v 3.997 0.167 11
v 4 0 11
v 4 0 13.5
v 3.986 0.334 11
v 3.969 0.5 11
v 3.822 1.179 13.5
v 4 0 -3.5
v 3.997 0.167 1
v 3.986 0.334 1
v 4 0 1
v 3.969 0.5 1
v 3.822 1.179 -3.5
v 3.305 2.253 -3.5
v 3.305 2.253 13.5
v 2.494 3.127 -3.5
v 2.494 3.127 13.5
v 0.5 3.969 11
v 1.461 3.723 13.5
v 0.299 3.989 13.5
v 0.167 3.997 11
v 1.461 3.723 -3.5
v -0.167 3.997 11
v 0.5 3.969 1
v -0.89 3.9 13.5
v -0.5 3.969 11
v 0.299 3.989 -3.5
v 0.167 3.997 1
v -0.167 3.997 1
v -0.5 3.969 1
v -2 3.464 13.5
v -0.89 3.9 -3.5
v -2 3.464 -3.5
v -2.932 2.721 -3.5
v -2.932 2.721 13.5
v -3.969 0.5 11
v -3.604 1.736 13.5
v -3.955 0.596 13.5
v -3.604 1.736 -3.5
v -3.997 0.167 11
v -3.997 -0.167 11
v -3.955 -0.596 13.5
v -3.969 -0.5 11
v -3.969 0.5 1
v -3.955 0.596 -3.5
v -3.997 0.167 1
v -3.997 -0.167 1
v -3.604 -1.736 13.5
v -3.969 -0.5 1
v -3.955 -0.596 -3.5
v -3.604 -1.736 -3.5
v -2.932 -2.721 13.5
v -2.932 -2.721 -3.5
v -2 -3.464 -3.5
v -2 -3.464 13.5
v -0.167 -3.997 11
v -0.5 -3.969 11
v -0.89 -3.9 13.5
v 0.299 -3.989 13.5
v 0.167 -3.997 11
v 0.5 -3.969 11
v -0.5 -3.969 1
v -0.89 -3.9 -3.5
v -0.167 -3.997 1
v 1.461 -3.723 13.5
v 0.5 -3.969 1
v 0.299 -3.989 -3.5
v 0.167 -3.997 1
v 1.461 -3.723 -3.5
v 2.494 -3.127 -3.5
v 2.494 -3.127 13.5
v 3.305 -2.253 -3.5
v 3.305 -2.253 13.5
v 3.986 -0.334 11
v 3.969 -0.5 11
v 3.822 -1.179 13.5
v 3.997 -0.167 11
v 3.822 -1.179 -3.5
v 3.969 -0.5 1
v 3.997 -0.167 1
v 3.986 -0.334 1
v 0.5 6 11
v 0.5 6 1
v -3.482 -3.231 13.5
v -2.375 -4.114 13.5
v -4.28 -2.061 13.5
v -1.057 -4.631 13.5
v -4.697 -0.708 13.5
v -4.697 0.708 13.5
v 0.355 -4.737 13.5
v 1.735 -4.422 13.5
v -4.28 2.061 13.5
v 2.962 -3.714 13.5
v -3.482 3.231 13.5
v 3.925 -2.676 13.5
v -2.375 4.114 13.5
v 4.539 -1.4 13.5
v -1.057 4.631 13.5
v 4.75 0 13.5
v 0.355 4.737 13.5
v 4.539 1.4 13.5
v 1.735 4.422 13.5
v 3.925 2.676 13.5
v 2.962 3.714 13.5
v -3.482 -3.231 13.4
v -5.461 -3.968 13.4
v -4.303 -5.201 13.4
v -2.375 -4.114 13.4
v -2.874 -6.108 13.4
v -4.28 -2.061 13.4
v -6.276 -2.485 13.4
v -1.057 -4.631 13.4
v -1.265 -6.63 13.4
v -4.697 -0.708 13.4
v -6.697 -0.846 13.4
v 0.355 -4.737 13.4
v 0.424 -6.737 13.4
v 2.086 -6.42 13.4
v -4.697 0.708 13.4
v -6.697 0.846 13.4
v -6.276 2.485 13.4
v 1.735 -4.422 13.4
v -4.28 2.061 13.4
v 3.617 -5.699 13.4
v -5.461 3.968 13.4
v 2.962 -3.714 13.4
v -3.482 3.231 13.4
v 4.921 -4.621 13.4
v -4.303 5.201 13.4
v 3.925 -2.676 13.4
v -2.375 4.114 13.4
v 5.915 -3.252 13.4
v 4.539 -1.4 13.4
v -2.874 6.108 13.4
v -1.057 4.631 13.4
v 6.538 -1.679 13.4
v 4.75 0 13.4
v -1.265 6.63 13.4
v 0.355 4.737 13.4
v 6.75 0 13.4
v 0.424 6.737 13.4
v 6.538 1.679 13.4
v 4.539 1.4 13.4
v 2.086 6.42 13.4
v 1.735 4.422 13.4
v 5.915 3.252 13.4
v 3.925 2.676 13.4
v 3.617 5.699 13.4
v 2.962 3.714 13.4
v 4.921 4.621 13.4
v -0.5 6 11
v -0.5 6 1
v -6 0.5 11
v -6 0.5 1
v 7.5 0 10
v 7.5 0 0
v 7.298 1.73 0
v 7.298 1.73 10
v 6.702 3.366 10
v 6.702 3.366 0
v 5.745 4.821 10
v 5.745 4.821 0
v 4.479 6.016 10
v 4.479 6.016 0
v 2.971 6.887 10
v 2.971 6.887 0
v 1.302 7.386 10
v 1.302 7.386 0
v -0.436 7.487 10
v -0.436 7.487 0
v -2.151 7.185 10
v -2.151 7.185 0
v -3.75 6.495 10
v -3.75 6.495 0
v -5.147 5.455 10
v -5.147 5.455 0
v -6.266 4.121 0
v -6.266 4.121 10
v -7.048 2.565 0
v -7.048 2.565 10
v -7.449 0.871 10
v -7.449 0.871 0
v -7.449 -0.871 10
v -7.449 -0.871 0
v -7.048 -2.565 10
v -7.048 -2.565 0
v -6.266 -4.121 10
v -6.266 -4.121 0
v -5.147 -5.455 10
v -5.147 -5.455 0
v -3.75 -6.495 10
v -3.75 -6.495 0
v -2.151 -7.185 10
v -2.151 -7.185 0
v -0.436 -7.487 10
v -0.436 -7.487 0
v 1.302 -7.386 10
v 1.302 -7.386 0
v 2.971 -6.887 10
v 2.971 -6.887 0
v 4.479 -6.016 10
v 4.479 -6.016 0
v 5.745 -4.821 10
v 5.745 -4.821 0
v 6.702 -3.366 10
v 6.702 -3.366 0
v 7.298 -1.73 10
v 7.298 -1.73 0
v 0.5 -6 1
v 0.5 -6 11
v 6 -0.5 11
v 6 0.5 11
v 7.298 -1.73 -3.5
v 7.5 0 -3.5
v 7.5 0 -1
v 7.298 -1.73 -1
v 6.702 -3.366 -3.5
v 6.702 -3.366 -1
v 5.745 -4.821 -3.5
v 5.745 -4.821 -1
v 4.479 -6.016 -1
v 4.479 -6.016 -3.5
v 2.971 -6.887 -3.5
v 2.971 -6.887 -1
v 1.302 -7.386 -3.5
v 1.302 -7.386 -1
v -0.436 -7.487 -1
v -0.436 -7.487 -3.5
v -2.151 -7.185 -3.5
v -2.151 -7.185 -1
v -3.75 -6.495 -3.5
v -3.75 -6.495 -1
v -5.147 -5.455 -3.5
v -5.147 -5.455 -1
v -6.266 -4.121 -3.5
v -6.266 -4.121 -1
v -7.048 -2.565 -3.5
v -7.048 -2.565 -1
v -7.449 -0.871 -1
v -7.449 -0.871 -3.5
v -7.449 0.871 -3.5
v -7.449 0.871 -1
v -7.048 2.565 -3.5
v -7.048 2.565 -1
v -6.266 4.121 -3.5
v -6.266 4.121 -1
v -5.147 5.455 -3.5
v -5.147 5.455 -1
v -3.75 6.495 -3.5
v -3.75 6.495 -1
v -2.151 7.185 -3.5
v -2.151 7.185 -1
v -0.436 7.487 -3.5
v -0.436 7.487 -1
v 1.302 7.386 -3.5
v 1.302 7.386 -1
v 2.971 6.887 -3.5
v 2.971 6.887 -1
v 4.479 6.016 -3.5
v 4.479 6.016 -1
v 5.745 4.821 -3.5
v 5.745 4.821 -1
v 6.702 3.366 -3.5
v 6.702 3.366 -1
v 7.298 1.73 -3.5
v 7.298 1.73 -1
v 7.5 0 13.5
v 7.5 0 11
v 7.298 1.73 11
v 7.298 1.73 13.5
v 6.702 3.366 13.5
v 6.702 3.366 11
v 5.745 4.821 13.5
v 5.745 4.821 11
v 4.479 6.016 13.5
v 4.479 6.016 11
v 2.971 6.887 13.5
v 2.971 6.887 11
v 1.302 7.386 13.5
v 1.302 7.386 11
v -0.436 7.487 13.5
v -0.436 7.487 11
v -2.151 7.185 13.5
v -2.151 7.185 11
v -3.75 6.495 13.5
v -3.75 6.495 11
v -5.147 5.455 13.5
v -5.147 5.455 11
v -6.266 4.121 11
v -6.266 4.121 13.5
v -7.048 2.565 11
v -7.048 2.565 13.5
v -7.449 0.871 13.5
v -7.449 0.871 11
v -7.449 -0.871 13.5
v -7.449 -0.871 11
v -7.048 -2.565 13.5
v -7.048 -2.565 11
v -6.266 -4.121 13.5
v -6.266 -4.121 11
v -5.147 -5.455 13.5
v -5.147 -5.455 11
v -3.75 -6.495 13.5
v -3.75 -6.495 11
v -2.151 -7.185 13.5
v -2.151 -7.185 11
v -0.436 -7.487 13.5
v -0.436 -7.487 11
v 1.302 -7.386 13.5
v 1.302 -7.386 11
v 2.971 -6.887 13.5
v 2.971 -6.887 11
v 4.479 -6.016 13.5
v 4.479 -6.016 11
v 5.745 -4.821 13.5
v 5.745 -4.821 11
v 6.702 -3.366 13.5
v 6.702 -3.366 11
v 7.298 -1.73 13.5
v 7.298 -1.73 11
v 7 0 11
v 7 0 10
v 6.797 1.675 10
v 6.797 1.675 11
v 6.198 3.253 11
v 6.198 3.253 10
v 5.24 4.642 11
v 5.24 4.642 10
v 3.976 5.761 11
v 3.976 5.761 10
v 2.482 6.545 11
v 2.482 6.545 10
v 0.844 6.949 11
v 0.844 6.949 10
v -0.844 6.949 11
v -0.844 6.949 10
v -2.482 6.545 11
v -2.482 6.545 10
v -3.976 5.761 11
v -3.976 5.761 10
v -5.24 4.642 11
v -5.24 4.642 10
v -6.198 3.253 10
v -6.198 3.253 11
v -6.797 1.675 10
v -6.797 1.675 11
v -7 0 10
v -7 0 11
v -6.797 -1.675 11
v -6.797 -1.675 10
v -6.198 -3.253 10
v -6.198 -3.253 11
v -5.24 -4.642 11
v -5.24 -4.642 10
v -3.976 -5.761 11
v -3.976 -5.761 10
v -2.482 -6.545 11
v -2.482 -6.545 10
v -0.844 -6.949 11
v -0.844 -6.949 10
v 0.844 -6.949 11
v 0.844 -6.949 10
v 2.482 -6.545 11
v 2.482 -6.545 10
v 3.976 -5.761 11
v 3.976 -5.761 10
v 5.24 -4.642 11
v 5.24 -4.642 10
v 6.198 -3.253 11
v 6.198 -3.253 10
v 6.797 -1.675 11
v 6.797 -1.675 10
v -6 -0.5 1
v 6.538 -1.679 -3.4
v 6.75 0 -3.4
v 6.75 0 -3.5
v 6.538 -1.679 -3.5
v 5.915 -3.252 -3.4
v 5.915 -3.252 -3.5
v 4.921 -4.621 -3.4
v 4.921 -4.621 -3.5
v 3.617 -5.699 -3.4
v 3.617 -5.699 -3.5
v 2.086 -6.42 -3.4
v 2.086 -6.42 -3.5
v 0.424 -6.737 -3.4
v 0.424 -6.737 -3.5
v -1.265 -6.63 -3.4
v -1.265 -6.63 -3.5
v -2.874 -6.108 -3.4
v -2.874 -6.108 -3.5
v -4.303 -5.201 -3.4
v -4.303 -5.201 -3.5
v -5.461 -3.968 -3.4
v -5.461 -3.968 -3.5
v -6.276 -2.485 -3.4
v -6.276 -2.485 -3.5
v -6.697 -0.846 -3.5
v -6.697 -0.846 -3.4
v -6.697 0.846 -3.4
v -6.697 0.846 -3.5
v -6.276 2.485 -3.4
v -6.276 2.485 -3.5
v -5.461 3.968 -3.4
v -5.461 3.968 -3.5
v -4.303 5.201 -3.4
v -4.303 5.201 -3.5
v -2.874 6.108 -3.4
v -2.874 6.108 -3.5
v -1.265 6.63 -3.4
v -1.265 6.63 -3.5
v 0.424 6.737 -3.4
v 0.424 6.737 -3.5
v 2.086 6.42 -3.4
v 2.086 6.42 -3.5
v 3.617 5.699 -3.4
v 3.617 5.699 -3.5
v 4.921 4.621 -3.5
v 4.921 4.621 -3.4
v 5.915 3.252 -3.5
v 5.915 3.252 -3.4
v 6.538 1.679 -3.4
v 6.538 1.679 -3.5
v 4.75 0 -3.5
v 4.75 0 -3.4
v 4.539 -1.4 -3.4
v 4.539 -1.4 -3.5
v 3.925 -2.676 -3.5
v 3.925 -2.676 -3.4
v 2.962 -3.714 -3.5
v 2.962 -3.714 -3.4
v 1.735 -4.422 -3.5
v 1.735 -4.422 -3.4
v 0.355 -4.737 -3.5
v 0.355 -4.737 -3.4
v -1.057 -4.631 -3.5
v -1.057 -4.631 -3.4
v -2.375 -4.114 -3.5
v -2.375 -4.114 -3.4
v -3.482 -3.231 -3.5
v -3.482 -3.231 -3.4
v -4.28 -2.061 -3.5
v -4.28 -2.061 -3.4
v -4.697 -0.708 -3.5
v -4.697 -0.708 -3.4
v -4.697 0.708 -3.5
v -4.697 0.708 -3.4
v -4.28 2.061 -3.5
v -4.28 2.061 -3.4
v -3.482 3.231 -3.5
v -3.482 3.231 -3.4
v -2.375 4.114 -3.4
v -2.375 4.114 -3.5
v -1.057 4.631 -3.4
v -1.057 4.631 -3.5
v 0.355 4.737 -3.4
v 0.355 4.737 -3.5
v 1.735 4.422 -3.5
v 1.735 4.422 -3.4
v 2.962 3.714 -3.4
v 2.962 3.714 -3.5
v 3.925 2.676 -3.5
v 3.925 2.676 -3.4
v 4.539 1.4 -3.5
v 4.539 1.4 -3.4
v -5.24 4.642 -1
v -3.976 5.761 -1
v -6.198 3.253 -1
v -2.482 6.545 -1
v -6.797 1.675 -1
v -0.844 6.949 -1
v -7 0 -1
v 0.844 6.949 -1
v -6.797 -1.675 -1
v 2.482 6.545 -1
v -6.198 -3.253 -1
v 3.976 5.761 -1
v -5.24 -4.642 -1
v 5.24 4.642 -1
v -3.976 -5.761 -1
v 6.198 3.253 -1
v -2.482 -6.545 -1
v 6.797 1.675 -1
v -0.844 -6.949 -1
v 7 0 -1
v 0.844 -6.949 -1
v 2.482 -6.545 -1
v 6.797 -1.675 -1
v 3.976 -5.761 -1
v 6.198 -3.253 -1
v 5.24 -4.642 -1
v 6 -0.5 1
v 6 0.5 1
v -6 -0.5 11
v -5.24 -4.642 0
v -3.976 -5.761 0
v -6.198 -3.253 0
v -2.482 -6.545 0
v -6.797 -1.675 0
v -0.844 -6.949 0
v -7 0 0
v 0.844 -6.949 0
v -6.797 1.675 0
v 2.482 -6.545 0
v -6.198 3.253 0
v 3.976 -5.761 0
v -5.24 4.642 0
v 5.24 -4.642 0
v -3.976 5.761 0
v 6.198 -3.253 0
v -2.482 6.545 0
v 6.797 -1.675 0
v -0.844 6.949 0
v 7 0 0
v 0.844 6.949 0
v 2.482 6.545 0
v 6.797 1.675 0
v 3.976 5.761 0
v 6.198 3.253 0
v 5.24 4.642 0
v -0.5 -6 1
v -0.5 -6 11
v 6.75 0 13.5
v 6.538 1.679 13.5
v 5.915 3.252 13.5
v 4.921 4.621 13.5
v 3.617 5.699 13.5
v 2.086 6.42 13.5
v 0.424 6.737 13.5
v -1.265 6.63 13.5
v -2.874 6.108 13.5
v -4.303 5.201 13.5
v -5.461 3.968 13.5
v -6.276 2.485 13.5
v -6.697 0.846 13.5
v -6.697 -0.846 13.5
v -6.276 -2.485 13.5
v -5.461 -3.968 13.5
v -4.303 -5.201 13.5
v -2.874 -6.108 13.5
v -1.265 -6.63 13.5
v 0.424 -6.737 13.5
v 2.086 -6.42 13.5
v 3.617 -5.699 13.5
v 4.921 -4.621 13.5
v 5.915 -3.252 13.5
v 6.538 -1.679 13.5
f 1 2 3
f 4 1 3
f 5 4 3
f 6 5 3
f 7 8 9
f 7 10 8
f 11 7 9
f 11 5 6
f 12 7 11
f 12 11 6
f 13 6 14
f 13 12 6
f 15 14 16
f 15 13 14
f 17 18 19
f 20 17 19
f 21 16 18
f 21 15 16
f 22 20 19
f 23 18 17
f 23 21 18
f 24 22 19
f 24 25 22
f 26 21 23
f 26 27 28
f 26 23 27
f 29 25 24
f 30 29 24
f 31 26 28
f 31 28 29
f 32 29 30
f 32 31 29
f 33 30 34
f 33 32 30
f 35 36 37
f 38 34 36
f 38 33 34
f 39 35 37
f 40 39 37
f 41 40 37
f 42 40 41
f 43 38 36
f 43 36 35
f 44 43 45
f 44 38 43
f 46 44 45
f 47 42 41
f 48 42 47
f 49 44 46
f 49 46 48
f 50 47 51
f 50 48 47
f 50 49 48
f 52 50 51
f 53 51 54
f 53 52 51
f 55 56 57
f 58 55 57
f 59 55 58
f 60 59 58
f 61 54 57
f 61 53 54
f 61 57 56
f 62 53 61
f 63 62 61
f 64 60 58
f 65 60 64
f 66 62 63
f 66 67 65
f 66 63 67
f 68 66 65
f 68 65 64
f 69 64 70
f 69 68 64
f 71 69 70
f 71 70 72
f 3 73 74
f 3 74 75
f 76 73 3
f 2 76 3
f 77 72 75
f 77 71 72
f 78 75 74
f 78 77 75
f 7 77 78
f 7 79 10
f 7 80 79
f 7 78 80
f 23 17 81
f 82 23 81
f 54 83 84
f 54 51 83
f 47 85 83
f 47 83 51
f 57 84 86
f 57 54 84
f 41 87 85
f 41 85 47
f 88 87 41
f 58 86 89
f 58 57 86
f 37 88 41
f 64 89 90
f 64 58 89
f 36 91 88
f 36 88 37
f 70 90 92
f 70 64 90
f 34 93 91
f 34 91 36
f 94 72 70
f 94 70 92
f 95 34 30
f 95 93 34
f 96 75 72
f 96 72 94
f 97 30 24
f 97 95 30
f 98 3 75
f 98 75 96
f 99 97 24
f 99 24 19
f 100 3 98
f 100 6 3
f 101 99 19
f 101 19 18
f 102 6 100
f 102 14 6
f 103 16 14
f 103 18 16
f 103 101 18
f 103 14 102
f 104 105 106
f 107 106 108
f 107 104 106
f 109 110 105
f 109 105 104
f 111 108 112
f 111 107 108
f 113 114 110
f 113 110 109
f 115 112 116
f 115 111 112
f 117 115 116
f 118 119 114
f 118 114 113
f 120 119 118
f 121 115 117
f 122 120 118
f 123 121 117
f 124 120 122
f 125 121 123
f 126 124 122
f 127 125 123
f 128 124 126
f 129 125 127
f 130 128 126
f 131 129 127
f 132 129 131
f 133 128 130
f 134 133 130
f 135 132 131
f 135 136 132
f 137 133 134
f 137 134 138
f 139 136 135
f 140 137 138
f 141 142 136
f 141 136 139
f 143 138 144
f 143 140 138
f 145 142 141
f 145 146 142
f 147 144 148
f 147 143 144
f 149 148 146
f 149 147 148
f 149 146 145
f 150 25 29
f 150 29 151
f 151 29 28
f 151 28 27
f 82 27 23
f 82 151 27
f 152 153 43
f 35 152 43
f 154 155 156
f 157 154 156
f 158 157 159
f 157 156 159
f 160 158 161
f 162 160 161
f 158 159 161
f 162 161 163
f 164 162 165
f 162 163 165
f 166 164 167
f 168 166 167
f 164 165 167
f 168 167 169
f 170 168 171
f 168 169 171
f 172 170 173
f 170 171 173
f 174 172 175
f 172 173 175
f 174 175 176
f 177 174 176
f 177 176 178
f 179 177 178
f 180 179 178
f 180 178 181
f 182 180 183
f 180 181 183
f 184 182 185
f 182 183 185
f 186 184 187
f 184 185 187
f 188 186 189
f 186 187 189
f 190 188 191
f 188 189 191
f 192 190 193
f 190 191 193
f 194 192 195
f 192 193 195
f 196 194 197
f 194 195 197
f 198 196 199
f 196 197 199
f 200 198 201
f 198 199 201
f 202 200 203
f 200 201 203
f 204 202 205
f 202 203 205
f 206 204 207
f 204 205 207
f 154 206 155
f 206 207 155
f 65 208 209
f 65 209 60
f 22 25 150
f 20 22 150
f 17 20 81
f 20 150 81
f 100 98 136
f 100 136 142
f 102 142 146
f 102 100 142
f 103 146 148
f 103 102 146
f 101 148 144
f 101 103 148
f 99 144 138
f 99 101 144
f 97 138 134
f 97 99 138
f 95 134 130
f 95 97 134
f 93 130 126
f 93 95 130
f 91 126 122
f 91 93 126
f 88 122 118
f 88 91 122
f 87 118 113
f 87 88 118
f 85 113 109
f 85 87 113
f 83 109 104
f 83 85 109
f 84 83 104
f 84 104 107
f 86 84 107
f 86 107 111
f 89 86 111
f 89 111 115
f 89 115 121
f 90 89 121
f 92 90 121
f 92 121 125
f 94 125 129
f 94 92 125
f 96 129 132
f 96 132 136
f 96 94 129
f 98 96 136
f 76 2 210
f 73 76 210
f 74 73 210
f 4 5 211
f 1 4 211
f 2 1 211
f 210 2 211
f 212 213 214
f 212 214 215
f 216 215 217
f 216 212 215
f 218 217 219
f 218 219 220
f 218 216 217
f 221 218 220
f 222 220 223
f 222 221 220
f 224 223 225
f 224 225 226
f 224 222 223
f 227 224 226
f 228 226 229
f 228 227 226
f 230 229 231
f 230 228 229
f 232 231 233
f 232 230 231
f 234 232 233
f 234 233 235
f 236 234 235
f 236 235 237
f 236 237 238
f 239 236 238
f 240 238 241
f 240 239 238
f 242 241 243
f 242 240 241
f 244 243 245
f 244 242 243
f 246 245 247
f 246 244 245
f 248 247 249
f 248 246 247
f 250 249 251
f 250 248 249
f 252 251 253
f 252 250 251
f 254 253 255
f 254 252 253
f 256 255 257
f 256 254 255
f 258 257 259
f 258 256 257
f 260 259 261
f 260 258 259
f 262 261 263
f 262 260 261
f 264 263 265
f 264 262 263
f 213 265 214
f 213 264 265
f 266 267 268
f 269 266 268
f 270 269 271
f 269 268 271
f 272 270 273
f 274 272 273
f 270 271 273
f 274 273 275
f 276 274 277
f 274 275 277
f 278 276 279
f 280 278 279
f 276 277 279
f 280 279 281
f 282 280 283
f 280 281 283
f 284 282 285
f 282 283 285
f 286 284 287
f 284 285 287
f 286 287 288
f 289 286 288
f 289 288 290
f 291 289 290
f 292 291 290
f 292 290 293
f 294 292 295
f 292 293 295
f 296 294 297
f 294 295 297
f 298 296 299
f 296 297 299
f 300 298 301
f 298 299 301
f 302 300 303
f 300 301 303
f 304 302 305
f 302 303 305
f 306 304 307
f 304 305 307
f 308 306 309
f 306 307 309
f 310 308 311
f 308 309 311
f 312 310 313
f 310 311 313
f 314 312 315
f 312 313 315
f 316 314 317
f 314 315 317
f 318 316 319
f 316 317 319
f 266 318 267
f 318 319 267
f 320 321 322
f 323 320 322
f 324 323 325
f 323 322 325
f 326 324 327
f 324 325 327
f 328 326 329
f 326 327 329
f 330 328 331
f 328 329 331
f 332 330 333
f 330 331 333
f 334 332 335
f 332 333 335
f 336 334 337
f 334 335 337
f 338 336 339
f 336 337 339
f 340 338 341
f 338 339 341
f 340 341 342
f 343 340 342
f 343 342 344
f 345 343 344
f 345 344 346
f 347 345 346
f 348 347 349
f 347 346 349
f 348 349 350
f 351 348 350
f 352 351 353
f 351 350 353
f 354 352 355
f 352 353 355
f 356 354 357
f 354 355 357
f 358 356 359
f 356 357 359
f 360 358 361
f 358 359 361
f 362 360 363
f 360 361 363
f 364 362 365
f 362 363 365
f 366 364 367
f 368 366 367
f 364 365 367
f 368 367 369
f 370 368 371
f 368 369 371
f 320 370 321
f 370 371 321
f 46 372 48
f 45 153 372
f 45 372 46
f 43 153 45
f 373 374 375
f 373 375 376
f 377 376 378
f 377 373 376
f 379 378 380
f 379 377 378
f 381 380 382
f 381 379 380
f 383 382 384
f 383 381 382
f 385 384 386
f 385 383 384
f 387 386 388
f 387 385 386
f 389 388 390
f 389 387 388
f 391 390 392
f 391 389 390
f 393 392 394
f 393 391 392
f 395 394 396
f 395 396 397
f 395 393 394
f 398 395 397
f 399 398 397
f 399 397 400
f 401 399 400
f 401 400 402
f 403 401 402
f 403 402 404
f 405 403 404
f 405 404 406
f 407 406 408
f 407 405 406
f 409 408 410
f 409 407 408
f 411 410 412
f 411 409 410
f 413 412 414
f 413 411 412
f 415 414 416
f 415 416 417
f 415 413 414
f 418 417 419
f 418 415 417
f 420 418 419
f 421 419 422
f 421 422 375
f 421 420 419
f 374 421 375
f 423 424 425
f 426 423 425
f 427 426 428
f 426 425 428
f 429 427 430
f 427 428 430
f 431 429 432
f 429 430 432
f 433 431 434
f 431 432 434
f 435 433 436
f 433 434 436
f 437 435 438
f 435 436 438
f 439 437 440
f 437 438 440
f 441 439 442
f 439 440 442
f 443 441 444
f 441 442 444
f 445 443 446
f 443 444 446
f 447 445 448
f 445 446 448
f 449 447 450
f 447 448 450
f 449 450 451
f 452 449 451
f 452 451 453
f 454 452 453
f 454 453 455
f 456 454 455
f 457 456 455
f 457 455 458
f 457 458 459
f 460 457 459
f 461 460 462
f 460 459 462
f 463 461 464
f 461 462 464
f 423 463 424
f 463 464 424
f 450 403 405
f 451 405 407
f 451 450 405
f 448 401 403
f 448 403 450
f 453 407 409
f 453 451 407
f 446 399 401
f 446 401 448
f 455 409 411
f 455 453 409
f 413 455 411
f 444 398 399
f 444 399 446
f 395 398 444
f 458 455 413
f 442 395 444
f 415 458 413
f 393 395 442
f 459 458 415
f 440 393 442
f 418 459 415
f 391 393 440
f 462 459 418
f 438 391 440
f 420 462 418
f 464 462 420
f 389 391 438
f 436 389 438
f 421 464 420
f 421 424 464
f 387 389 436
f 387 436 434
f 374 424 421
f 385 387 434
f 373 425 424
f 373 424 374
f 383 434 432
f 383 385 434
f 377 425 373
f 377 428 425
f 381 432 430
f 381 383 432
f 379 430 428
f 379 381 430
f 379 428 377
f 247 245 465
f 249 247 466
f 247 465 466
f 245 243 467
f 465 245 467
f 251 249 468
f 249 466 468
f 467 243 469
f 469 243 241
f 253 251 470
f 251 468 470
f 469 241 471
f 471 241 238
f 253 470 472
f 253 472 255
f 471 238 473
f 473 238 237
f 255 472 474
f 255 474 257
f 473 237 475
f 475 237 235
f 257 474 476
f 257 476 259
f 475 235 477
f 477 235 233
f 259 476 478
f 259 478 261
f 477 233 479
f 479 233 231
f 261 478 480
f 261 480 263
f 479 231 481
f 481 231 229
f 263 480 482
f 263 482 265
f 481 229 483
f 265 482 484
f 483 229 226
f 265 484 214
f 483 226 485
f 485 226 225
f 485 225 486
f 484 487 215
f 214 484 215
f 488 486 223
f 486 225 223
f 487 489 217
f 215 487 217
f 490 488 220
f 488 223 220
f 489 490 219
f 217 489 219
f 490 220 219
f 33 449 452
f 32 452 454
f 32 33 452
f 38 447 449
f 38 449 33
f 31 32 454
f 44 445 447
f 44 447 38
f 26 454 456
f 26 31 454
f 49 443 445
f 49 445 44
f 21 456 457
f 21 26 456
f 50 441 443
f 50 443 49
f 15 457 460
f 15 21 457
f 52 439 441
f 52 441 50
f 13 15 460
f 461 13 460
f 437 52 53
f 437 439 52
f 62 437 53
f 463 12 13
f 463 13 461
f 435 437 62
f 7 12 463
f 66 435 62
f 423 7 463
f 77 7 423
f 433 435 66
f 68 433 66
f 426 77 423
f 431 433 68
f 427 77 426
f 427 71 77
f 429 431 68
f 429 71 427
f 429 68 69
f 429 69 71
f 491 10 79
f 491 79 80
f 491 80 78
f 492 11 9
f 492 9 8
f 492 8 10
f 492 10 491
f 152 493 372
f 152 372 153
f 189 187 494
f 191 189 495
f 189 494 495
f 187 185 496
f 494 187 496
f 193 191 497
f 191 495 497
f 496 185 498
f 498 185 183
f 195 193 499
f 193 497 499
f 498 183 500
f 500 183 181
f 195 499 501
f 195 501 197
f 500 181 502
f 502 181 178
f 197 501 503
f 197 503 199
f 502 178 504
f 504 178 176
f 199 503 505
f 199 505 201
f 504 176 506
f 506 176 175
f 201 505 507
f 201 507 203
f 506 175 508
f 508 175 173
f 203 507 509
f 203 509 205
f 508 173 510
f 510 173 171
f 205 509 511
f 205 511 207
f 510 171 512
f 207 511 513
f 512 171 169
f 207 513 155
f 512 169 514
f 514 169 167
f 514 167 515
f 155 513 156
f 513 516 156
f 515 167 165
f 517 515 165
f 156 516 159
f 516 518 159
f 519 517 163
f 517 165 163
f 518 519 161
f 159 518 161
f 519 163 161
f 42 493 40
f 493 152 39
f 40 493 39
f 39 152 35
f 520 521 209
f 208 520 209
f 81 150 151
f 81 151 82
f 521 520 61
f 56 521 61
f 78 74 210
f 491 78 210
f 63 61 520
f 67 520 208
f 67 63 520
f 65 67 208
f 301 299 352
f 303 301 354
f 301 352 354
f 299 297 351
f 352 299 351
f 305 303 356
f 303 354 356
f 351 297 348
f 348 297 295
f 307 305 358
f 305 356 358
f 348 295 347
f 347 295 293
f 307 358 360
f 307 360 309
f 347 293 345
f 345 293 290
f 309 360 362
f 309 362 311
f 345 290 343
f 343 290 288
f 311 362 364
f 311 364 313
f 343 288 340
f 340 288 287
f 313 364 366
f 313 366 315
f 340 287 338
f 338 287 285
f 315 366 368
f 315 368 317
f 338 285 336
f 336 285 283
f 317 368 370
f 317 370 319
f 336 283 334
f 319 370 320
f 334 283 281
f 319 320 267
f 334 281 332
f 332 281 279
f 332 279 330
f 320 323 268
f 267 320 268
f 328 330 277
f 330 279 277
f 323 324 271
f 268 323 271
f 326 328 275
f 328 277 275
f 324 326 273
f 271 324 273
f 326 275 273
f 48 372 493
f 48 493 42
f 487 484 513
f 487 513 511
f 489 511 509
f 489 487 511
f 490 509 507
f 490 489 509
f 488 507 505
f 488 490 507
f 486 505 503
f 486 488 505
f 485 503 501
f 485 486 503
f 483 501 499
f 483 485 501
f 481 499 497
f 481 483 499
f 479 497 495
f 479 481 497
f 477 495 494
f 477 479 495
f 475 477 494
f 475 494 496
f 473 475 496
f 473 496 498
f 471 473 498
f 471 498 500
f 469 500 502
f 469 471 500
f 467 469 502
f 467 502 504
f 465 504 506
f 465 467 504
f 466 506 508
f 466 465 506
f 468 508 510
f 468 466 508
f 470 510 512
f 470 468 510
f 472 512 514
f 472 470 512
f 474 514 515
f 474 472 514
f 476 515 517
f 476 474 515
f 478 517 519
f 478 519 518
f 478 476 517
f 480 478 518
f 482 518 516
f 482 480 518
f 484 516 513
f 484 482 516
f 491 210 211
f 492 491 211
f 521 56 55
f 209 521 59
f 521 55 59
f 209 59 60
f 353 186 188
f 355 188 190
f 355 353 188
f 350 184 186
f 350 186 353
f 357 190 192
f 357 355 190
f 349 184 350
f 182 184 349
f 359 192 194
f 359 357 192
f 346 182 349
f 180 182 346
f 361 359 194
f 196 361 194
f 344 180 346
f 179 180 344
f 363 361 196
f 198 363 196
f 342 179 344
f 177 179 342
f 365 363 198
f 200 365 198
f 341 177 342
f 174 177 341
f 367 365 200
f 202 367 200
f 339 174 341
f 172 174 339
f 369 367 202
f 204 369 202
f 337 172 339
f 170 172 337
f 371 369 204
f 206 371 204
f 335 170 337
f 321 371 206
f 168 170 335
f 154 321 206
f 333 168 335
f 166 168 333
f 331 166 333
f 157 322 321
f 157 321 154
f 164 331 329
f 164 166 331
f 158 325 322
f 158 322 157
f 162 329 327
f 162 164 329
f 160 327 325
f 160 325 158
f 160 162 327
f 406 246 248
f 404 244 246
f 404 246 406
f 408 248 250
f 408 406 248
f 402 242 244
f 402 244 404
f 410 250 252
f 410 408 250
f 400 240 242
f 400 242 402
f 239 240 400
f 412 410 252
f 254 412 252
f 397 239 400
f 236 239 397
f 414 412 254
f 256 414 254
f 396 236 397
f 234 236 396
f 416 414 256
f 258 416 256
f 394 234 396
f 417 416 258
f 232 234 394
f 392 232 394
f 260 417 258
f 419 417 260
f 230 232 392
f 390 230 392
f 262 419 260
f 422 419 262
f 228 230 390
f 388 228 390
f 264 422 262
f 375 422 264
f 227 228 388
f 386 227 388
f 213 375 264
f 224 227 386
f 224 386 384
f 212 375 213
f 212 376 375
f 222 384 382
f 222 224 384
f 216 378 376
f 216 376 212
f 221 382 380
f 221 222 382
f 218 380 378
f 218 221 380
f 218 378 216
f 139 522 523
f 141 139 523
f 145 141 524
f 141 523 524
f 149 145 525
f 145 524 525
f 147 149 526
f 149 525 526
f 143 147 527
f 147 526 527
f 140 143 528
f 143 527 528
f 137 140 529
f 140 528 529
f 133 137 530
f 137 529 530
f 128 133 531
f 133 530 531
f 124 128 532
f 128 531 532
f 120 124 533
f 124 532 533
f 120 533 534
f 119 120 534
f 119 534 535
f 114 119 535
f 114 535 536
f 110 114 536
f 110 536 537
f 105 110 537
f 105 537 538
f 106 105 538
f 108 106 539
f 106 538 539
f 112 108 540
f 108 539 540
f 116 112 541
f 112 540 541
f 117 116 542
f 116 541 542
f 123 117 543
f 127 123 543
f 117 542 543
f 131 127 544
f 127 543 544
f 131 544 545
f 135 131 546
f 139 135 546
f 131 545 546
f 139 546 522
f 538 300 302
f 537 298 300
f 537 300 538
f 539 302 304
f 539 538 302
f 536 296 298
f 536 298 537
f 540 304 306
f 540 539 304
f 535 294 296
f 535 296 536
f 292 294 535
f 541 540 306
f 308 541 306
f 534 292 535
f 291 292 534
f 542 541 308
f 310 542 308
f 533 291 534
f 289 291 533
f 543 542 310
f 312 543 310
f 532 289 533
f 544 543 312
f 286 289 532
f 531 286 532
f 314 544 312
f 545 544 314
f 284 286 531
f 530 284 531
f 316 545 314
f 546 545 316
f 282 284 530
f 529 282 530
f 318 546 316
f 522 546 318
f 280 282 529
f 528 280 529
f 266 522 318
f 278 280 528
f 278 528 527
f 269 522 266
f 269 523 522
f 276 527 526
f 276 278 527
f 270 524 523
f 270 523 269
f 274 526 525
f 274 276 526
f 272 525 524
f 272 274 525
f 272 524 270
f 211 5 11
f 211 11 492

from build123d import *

# Parameters (mm, degrees)
SKETCH1_R           = 7.5
SKETCH1_R_2         = 4
BOSS_EXTRUDE1_DEPTH = 10
SKETCH2_R           = 7
BOSS_EXTRUDE2_DEPTH = 1
BOSS_EXTRUDE3_START = 1
SKETCH3_R           = 7
BOSS_EXTRUDE3_DEPTH = 1
BOSS_EXTRUDE4_START = 2.5
SKETCH5_R           = 7.5
BOSS_EXTRUDE4_DEPTH = 2.5
SKETCH10_W          = 1
SKETCH10_H          = 12
CUT_EXTRUDE4_DEPTH  = 10
SKETCH11_W          = 12
SKETCH11_H          = 1
CUT_EXTRUDE5_DEPTH  = 10
SKETCH6_R           = 7.5
BOSS_EXTRUDE6_DEPTH = 2.5
CUT_EXTRUDE1_START  = -17
SKETCH7_R           = 4
CUT_EXTRUDE1_DEPTH  = 17
SKETCH8_R           = 6.75
SKETCH8_R_2         = 4.75
CUT_EXTRUDE2_DEPTH  = 0.1
CUT_EXTRUDE3_START  = -0.1
SKETCH9_R           = 6.75
SKETCH9_R_2         = 4.75
CUT_EXTRUDE3_DEPTH  = 0.1


with BuildPart() as part:
    # Sketch1 → Boss-Extrude1 (new body)
    with BuildSketch(Plane.XY):
        Circle(SKETCH1_R)
        Circle(SKETCH1_R_2, mode=Mode.SUBTRACT)
    extrude(amount=BOSS_EXTRUDE1_DEPTH)

    # Sketch2 → Boss-Extrude2 (add)
    with BuildSketch(Plane.XY.offset(10)):
        Circle(SKETCH2_R)
    extrude(amount=BOSS_EXTRUDE2_DEPTH)

    # Sketch3 → Boss-Extrude3 (add)
    with BuildSketch(Plane(origin=(0, 0, 0), x_dir=(-1, 0, 0), z_dir=(0, 0, -1)).offset(BOSS_EXTRUDE3_START)):
        with Locations(Location((0, 0, 0), (0, 0, 180))):
            Circle(SKETCH3_R)
    extrude(amount=-BOSS_EXTRUDE3_DEPTH)

    # Sketch5 → Boss-Extrude4 (add)
    with BuildSketch(Plane(origin=(0, 0, -1), x_dir=(-1, 0, 0), z_dir=(0, 0, -1)).offset(BOSS_EXTRUDE4_START)):
        with Locations(Location((0, 0, 0), (0, 0, 180))):
            Circle(SKETCH5_R)
    extrude(amount=-BOSS_EXTRUDE4_DEPTH)

    # Sketch10 → Cut-Extrude4 (cut)
    with BuildSketch(Plane.XY.offset(11)):
        Rectangle(SKETCH10_W, SKETCH10_H)
    extrude(amount=-CUT_EXTRUDE4_DEPTH, mode=Mode.SUBTRACT)

    # Sketch11 → Cut-Extrude5 (cut)
    with BuildSketch(Plane.XY.offset(11)):
        Rectangle(SKETCH11_W, SKETCH11_H)
    extrude(amount=-CUT_EXTRUDE5_DEPTH, mode=Mode.SUBTRACT)

    # Sketch6 → Boss-Extrude6 (add)
    with BuildSketch(Plane.XY.offset(11)):
        Circle(SKETCH6_R)
    extrude(amount=BOSS_EXTRUDE6_DEPTH)

    # Sketch7 → Cut-Extrude1 (cut)
    with BuildSketch(Plane.XY.offset(13.5).offset(CUT_EXTRUDE1_START)):
        Circle(SKETCH7_R)
    extrude(amount=CUT_EXTRUDE1_DEPTH, mode=Mode.SUBTRACT)

    # Sketch8 → Cut-Extrude2 (cut)
    with BuildSketch(Plane.XY.offset(13.5)):
        Circle(SKETCH8_R)
        Circle(SKETCH8_R_2, mode=Mode.SUBTRACT)
    extrude(amount=-CUT_EXTRUDE2_DEPTH, mode=Mode.SUBTRACT)

    # Sketch9 → Cut-Extrude3 (cut)
    with BuildSketch(Plane(origin=(0, 0, -3.5), x_dir=(-1, 0, 0), z_dir=(0, 0, -1)).offset(CUT_EXTRUDE3_START)):
        with Locations(Location((0, 0, 0), (0, 0, 180))):
            Circle(SKETCH9_R)
        with Locations(Location((0, 0, 0), (0, 0, 180))):
            Circle(SKETCH9_R_2, mode=Mode.SUBTRACT)
    extrude(amount=CUT_EXTRUDE3_DEPTH, mode=Mode.SUBTRACT)


solid = part.part
